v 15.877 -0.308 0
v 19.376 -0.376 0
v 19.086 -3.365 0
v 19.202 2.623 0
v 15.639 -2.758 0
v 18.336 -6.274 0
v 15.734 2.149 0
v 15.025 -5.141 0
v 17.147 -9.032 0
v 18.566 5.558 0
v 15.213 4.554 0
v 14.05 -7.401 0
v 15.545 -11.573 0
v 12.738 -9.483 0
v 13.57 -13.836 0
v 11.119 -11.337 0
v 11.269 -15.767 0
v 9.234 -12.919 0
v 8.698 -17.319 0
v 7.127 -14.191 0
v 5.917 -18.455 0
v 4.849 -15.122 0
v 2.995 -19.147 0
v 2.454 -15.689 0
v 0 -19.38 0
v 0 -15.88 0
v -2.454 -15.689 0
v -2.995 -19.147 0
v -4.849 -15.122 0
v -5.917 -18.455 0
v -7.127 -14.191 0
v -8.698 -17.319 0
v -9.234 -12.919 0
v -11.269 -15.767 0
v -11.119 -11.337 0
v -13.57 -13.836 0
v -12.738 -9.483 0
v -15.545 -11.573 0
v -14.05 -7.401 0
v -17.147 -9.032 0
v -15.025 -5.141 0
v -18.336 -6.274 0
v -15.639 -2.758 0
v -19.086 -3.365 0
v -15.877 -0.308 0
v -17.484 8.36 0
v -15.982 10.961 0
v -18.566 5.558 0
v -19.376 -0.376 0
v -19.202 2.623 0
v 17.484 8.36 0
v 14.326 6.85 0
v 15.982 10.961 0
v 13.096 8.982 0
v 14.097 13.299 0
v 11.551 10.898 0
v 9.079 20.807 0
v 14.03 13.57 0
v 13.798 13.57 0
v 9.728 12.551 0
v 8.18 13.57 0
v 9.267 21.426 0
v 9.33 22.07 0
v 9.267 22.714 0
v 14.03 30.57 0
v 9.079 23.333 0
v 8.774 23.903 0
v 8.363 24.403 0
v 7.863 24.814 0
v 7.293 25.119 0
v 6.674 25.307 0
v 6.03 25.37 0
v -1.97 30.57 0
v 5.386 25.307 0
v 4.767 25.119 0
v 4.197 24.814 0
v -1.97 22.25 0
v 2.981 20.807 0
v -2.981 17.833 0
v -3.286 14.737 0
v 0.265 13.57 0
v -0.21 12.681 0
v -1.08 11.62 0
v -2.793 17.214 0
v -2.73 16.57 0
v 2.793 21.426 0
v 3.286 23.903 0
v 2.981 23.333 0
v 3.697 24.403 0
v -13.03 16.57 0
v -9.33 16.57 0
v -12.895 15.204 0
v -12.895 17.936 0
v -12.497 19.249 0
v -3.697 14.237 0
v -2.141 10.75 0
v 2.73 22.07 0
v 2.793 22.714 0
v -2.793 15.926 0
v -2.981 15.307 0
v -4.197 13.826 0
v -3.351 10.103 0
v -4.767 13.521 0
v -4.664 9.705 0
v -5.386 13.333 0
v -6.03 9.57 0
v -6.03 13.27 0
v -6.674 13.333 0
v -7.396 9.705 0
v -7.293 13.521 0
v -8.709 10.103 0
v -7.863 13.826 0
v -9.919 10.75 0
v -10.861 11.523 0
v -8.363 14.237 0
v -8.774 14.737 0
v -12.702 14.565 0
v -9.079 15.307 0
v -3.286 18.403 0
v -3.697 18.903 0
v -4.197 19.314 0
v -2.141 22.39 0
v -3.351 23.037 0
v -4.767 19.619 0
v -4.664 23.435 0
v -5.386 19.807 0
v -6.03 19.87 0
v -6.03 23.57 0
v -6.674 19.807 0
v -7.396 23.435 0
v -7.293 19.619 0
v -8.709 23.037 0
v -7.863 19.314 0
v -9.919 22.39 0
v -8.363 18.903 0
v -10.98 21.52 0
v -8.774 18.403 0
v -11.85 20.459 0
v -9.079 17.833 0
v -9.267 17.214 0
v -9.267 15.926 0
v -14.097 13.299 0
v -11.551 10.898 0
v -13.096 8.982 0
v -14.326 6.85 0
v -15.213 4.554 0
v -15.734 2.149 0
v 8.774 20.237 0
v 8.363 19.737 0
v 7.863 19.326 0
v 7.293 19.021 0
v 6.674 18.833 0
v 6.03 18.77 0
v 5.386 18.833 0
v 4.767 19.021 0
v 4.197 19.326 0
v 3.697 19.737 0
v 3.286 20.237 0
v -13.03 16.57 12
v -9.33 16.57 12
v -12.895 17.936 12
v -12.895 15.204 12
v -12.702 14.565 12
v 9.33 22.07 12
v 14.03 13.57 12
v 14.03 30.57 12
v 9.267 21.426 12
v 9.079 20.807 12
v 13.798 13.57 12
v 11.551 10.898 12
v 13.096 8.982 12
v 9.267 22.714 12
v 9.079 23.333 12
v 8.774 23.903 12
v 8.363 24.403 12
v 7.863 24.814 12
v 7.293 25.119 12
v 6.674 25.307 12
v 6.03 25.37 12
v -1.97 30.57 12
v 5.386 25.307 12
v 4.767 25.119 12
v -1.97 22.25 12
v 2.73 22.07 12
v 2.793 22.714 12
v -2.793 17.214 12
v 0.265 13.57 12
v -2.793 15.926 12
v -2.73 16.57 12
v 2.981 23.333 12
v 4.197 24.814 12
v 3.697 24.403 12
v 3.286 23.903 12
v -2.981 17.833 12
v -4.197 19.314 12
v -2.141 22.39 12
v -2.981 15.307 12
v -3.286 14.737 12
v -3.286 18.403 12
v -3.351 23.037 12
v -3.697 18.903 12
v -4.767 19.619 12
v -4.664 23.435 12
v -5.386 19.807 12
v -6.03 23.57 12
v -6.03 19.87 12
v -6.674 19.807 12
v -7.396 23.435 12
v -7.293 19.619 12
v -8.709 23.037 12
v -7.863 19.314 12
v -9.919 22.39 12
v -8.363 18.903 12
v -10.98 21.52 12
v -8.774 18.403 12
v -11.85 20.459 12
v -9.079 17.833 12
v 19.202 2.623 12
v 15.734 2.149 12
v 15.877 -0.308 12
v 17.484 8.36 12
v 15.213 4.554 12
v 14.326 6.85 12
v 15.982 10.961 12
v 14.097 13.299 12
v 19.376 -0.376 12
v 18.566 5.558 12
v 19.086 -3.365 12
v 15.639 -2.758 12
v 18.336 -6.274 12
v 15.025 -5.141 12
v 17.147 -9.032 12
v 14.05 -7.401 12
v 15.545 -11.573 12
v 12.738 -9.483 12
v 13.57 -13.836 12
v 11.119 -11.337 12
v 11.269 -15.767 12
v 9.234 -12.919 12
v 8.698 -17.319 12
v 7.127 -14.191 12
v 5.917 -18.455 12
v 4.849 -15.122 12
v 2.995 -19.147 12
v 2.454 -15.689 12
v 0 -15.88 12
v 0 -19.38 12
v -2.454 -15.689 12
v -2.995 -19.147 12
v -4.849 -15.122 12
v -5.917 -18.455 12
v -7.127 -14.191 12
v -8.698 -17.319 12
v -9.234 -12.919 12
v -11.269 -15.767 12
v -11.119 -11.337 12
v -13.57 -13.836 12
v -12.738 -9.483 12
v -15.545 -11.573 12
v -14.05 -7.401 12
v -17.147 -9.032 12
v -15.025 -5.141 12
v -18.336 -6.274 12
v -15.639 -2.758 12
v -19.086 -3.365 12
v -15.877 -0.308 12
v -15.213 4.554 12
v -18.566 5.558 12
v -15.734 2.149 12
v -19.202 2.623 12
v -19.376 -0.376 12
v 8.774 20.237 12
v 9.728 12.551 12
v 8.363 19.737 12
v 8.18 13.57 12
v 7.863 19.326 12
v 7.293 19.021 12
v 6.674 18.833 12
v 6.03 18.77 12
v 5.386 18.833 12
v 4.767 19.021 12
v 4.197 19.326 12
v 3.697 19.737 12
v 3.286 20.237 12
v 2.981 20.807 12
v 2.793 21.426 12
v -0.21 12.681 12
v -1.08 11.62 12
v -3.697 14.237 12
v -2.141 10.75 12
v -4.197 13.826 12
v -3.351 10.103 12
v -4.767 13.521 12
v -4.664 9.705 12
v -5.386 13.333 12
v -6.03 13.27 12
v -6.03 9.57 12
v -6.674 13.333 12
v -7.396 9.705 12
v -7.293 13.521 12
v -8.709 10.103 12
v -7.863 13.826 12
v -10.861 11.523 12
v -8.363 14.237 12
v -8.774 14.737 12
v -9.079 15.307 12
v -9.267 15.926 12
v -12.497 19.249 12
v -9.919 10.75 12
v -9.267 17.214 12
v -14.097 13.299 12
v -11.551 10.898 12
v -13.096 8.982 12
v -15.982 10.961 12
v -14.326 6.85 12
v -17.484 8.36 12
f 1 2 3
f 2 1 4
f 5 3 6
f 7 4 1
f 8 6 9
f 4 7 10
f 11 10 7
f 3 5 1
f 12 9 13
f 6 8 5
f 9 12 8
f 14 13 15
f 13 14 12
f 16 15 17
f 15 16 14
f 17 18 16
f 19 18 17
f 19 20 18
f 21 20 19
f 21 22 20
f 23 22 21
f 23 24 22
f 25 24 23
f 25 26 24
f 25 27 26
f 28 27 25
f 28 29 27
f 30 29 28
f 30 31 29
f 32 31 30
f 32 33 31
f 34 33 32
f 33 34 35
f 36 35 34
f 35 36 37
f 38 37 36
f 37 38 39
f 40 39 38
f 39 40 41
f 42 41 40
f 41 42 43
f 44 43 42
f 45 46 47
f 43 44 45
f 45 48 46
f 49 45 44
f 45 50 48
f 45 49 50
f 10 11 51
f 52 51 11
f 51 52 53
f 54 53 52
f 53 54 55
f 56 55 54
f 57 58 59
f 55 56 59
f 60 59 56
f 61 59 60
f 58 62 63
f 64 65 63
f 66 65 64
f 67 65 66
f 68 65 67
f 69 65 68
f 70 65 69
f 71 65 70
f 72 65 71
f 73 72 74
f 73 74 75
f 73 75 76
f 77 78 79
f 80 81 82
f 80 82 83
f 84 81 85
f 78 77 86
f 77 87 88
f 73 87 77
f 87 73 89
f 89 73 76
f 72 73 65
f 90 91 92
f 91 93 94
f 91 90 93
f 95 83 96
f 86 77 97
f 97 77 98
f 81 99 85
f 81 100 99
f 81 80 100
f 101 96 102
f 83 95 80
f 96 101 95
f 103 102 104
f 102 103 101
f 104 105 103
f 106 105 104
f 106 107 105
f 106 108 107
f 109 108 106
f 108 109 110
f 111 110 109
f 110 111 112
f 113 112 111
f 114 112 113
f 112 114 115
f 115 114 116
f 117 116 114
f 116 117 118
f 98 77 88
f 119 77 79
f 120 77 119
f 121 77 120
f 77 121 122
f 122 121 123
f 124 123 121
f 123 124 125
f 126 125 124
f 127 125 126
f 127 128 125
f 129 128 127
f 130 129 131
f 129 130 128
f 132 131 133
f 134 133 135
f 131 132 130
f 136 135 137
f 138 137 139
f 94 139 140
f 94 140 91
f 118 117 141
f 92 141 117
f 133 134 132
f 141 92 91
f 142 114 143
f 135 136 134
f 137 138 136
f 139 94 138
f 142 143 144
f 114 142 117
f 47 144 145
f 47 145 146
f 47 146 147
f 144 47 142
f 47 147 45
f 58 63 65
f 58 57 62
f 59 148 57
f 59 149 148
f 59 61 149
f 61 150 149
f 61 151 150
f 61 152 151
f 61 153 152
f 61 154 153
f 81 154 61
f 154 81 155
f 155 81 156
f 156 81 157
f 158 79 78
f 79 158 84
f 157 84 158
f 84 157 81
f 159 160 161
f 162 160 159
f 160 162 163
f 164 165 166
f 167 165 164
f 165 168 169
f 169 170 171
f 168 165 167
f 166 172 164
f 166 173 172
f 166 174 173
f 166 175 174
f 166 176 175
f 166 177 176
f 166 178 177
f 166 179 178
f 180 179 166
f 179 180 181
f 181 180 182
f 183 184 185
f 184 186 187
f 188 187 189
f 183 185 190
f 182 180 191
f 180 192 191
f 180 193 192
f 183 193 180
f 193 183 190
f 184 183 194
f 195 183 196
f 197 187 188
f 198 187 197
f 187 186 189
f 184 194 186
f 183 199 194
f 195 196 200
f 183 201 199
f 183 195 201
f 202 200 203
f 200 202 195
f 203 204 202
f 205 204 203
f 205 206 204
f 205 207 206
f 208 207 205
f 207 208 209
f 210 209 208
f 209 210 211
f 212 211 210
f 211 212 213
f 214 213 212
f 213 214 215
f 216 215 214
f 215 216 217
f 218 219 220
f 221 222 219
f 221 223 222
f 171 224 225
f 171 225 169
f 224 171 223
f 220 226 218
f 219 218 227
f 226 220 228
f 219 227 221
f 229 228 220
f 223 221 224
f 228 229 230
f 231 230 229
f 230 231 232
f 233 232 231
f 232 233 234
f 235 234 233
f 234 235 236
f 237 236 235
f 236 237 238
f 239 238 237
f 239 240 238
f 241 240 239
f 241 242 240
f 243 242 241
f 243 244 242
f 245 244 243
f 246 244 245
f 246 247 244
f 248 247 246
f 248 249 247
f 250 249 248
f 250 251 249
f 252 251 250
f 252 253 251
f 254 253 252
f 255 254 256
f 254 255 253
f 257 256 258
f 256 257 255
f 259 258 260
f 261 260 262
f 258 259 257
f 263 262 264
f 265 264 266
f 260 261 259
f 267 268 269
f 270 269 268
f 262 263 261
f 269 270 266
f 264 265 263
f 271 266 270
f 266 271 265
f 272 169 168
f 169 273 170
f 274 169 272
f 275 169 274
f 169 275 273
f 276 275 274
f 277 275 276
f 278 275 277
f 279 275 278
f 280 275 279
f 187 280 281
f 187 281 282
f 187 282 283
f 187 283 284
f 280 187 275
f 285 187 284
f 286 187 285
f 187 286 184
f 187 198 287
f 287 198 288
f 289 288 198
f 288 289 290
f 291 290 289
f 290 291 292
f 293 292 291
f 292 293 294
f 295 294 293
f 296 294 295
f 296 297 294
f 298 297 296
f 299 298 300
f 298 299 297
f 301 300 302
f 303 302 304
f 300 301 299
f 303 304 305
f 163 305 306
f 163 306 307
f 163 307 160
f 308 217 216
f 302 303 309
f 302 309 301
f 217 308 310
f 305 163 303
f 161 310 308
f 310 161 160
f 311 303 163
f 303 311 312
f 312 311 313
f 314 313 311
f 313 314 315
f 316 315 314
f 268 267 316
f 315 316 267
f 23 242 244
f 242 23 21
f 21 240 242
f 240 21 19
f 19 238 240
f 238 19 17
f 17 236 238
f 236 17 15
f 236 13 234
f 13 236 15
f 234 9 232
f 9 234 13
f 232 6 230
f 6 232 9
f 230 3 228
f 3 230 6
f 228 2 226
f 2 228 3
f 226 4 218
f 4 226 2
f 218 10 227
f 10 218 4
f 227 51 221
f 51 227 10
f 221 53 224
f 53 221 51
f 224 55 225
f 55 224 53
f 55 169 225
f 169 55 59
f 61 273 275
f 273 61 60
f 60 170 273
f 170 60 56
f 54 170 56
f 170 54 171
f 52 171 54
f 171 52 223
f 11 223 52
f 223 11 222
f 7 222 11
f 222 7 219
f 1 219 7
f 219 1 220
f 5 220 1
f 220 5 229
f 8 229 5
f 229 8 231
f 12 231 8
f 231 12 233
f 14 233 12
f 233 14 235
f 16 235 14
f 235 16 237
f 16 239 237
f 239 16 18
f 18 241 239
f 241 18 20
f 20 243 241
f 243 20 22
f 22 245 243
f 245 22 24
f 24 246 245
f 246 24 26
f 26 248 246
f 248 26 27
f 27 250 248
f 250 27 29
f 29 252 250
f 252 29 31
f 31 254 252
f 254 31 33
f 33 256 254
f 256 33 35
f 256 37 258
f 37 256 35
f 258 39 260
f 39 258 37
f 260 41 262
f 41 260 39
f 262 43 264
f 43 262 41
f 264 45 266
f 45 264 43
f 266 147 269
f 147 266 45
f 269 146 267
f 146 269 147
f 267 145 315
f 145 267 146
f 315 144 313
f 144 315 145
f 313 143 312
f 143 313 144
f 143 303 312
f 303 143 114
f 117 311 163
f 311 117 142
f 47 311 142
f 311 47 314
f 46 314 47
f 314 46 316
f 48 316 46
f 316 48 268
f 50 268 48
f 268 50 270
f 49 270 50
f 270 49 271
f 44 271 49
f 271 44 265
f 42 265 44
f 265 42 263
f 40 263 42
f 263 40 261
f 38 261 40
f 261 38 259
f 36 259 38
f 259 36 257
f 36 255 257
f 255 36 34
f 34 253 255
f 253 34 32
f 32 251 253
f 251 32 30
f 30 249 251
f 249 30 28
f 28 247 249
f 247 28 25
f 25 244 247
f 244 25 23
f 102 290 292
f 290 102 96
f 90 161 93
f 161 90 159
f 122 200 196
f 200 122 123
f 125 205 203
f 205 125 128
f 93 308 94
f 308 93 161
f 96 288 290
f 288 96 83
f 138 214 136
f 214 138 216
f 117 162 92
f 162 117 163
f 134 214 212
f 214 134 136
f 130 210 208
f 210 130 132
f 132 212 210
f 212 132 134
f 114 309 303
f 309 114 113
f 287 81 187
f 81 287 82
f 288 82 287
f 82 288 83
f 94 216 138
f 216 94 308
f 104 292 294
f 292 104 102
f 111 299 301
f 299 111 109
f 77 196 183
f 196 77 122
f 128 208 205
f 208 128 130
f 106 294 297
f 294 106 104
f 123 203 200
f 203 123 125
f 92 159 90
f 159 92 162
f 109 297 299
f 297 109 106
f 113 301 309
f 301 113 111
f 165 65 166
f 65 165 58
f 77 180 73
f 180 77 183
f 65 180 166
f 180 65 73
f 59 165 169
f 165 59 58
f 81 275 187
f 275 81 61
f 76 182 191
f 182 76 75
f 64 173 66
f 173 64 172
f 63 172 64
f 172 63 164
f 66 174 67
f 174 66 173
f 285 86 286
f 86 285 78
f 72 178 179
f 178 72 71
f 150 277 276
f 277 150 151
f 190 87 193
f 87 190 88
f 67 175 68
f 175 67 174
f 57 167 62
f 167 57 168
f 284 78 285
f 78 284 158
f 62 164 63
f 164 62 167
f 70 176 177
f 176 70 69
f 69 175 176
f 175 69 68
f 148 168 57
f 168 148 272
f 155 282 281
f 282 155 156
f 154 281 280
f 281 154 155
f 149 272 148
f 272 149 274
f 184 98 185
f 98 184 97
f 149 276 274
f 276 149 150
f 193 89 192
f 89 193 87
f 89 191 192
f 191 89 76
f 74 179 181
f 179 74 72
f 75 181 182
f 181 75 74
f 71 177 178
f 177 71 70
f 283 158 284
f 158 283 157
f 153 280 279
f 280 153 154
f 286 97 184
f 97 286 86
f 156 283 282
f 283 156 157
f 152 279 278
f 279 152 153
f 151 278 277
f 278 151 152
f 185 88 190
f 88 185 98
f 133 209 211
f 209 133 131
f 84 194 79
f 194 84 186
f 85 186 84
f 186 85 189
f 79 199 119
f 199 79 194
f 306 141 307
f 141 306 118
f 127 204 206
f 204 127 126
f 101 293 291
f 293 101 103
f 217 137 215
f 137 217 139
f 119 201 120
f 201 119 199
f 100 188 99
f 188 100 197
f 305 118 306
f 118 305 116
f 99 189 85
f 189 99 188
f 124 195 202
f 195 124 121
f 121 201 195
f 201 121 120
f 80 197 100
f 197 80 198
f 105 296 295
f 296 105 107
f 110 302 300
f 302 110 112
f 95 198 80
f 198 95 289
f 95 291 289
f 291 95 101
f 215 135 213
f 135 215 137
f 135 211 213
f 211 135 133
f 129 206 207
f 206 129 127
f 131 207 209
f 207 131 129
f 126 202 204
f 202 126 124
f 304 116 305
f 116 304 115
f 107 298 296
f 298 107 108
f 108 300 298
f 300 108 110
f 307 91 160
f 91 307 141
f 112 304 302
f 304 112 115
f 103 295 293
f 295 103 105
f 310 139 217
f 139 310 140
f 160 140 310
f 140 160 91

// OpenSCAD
$fn = 32;

// ----------------------------------------------------------------------
// Pipe clamp: 38.76 mm ring, 3.5 mm wall, 12 mm wide
// ----------------------------------------------------------------------

// --- parameters (mm) ---
outer_r = 19.38;          // clamp outside radius
inner_r = 15.88;          // pipe bore radius
band = 3.5;               // band thickness
clamp_w = 12;             // clamp width
opening = 40;             // opening angle between the ends
lug_w = 16;               // lug width
lug_len = 17;             // lug length
bolt_d = 6.6;             // bolt hole
knuckle_d = 14;           // hinge knuckle diameter
pin_d = 6.6;              // hinge pin hole

clamp_profile = [[-6.628, 18.211], [-9.363, 16.968], [-11.872, 15.318], [-14.097, 13.299], [-15.982, 10.961], [-17.484, 8.36], [-18.566, 5.558], [-19.202, 2.623], [-19.376, -0.376], [-19.086, -3.365], [-18.336, -6.274], [-17.147, -9.032], [-15.545, -11.573], [-13.57, -13.836], [-11.269, -15.767], [-8.698, -17.319], [-5.917, -18.455], [-2.995, -19.147], [0, -19.38], [2.995, -19.147], [5.917, -18.455], [8.698, -17.319], [11.269, -15.767], [13.57, -13.836], [15.545, -11.573], [17.147, -9.032], [18.336, -6.274], [19.086, -3.365], [19.376, -0.376], [19.202, 2.623], [18.566, 5.558], [17.484, 8.36], [15.982, 10.961], [14.097, 13.299], [11.872, 15.318], [9.363, 16.968], [6.628, 18.211], [5.431, 14.922], [7.672, 13.904], [9.728, 12.551], [11.551, 10.898], [13.096, 8.982], [14.326, 6.85], [15.213, 4.554], [15.734, 2.149], [15.877, -0.308], [15.639, -2.758], [15.025, -5.141], [14.05, -7.401], [12.738, -9.483], [11.119, -11.337], [9.234, -12.919], [7.127, -14.191], [4.849, -15.122], [2.454, -15.689], [0, -15.88], [-2.454, -15.689], [-4.849, -15.122], [-7.127, -14.191], [-9.234, -12.919], [-11.119, -11.337], [-12.738, -9.483], [-14.05, -7.401], [-15.025, -5.141], [-15.639, -2.758], [-15.877, -0.308], [-15.734, 2.149], [-15.213, 4.554], [-14.326, 6.85], [-13.096, 8.982], [-11.551, 10.898], [-9.728, 12.551], [-7.672, 13.904], [-5.431, 14.922]];

difference() {
  union() {
    linear_extrude(height = clamp_w) polygon(clamp_profile);
    /* hinge knuckle, sunk 2 mm into the band end */
    translate([-6.03, 16.57, 0]) cylinder(h = clamp_w, d = knuckle_d);
    /* bolt lug on the other end */
    translate([-1.97, 13.57, 0]) cube([lug_w, 17, clamp_w]);
  }
  translate([6.03, 22.07, -2.5]) cylinder(h = clamp_w + 5, d = bolt_d);
  translate([-6.03, 16.57, -2.5]) cylinder(h = clamp_w + 5, d = pin_d);
}
